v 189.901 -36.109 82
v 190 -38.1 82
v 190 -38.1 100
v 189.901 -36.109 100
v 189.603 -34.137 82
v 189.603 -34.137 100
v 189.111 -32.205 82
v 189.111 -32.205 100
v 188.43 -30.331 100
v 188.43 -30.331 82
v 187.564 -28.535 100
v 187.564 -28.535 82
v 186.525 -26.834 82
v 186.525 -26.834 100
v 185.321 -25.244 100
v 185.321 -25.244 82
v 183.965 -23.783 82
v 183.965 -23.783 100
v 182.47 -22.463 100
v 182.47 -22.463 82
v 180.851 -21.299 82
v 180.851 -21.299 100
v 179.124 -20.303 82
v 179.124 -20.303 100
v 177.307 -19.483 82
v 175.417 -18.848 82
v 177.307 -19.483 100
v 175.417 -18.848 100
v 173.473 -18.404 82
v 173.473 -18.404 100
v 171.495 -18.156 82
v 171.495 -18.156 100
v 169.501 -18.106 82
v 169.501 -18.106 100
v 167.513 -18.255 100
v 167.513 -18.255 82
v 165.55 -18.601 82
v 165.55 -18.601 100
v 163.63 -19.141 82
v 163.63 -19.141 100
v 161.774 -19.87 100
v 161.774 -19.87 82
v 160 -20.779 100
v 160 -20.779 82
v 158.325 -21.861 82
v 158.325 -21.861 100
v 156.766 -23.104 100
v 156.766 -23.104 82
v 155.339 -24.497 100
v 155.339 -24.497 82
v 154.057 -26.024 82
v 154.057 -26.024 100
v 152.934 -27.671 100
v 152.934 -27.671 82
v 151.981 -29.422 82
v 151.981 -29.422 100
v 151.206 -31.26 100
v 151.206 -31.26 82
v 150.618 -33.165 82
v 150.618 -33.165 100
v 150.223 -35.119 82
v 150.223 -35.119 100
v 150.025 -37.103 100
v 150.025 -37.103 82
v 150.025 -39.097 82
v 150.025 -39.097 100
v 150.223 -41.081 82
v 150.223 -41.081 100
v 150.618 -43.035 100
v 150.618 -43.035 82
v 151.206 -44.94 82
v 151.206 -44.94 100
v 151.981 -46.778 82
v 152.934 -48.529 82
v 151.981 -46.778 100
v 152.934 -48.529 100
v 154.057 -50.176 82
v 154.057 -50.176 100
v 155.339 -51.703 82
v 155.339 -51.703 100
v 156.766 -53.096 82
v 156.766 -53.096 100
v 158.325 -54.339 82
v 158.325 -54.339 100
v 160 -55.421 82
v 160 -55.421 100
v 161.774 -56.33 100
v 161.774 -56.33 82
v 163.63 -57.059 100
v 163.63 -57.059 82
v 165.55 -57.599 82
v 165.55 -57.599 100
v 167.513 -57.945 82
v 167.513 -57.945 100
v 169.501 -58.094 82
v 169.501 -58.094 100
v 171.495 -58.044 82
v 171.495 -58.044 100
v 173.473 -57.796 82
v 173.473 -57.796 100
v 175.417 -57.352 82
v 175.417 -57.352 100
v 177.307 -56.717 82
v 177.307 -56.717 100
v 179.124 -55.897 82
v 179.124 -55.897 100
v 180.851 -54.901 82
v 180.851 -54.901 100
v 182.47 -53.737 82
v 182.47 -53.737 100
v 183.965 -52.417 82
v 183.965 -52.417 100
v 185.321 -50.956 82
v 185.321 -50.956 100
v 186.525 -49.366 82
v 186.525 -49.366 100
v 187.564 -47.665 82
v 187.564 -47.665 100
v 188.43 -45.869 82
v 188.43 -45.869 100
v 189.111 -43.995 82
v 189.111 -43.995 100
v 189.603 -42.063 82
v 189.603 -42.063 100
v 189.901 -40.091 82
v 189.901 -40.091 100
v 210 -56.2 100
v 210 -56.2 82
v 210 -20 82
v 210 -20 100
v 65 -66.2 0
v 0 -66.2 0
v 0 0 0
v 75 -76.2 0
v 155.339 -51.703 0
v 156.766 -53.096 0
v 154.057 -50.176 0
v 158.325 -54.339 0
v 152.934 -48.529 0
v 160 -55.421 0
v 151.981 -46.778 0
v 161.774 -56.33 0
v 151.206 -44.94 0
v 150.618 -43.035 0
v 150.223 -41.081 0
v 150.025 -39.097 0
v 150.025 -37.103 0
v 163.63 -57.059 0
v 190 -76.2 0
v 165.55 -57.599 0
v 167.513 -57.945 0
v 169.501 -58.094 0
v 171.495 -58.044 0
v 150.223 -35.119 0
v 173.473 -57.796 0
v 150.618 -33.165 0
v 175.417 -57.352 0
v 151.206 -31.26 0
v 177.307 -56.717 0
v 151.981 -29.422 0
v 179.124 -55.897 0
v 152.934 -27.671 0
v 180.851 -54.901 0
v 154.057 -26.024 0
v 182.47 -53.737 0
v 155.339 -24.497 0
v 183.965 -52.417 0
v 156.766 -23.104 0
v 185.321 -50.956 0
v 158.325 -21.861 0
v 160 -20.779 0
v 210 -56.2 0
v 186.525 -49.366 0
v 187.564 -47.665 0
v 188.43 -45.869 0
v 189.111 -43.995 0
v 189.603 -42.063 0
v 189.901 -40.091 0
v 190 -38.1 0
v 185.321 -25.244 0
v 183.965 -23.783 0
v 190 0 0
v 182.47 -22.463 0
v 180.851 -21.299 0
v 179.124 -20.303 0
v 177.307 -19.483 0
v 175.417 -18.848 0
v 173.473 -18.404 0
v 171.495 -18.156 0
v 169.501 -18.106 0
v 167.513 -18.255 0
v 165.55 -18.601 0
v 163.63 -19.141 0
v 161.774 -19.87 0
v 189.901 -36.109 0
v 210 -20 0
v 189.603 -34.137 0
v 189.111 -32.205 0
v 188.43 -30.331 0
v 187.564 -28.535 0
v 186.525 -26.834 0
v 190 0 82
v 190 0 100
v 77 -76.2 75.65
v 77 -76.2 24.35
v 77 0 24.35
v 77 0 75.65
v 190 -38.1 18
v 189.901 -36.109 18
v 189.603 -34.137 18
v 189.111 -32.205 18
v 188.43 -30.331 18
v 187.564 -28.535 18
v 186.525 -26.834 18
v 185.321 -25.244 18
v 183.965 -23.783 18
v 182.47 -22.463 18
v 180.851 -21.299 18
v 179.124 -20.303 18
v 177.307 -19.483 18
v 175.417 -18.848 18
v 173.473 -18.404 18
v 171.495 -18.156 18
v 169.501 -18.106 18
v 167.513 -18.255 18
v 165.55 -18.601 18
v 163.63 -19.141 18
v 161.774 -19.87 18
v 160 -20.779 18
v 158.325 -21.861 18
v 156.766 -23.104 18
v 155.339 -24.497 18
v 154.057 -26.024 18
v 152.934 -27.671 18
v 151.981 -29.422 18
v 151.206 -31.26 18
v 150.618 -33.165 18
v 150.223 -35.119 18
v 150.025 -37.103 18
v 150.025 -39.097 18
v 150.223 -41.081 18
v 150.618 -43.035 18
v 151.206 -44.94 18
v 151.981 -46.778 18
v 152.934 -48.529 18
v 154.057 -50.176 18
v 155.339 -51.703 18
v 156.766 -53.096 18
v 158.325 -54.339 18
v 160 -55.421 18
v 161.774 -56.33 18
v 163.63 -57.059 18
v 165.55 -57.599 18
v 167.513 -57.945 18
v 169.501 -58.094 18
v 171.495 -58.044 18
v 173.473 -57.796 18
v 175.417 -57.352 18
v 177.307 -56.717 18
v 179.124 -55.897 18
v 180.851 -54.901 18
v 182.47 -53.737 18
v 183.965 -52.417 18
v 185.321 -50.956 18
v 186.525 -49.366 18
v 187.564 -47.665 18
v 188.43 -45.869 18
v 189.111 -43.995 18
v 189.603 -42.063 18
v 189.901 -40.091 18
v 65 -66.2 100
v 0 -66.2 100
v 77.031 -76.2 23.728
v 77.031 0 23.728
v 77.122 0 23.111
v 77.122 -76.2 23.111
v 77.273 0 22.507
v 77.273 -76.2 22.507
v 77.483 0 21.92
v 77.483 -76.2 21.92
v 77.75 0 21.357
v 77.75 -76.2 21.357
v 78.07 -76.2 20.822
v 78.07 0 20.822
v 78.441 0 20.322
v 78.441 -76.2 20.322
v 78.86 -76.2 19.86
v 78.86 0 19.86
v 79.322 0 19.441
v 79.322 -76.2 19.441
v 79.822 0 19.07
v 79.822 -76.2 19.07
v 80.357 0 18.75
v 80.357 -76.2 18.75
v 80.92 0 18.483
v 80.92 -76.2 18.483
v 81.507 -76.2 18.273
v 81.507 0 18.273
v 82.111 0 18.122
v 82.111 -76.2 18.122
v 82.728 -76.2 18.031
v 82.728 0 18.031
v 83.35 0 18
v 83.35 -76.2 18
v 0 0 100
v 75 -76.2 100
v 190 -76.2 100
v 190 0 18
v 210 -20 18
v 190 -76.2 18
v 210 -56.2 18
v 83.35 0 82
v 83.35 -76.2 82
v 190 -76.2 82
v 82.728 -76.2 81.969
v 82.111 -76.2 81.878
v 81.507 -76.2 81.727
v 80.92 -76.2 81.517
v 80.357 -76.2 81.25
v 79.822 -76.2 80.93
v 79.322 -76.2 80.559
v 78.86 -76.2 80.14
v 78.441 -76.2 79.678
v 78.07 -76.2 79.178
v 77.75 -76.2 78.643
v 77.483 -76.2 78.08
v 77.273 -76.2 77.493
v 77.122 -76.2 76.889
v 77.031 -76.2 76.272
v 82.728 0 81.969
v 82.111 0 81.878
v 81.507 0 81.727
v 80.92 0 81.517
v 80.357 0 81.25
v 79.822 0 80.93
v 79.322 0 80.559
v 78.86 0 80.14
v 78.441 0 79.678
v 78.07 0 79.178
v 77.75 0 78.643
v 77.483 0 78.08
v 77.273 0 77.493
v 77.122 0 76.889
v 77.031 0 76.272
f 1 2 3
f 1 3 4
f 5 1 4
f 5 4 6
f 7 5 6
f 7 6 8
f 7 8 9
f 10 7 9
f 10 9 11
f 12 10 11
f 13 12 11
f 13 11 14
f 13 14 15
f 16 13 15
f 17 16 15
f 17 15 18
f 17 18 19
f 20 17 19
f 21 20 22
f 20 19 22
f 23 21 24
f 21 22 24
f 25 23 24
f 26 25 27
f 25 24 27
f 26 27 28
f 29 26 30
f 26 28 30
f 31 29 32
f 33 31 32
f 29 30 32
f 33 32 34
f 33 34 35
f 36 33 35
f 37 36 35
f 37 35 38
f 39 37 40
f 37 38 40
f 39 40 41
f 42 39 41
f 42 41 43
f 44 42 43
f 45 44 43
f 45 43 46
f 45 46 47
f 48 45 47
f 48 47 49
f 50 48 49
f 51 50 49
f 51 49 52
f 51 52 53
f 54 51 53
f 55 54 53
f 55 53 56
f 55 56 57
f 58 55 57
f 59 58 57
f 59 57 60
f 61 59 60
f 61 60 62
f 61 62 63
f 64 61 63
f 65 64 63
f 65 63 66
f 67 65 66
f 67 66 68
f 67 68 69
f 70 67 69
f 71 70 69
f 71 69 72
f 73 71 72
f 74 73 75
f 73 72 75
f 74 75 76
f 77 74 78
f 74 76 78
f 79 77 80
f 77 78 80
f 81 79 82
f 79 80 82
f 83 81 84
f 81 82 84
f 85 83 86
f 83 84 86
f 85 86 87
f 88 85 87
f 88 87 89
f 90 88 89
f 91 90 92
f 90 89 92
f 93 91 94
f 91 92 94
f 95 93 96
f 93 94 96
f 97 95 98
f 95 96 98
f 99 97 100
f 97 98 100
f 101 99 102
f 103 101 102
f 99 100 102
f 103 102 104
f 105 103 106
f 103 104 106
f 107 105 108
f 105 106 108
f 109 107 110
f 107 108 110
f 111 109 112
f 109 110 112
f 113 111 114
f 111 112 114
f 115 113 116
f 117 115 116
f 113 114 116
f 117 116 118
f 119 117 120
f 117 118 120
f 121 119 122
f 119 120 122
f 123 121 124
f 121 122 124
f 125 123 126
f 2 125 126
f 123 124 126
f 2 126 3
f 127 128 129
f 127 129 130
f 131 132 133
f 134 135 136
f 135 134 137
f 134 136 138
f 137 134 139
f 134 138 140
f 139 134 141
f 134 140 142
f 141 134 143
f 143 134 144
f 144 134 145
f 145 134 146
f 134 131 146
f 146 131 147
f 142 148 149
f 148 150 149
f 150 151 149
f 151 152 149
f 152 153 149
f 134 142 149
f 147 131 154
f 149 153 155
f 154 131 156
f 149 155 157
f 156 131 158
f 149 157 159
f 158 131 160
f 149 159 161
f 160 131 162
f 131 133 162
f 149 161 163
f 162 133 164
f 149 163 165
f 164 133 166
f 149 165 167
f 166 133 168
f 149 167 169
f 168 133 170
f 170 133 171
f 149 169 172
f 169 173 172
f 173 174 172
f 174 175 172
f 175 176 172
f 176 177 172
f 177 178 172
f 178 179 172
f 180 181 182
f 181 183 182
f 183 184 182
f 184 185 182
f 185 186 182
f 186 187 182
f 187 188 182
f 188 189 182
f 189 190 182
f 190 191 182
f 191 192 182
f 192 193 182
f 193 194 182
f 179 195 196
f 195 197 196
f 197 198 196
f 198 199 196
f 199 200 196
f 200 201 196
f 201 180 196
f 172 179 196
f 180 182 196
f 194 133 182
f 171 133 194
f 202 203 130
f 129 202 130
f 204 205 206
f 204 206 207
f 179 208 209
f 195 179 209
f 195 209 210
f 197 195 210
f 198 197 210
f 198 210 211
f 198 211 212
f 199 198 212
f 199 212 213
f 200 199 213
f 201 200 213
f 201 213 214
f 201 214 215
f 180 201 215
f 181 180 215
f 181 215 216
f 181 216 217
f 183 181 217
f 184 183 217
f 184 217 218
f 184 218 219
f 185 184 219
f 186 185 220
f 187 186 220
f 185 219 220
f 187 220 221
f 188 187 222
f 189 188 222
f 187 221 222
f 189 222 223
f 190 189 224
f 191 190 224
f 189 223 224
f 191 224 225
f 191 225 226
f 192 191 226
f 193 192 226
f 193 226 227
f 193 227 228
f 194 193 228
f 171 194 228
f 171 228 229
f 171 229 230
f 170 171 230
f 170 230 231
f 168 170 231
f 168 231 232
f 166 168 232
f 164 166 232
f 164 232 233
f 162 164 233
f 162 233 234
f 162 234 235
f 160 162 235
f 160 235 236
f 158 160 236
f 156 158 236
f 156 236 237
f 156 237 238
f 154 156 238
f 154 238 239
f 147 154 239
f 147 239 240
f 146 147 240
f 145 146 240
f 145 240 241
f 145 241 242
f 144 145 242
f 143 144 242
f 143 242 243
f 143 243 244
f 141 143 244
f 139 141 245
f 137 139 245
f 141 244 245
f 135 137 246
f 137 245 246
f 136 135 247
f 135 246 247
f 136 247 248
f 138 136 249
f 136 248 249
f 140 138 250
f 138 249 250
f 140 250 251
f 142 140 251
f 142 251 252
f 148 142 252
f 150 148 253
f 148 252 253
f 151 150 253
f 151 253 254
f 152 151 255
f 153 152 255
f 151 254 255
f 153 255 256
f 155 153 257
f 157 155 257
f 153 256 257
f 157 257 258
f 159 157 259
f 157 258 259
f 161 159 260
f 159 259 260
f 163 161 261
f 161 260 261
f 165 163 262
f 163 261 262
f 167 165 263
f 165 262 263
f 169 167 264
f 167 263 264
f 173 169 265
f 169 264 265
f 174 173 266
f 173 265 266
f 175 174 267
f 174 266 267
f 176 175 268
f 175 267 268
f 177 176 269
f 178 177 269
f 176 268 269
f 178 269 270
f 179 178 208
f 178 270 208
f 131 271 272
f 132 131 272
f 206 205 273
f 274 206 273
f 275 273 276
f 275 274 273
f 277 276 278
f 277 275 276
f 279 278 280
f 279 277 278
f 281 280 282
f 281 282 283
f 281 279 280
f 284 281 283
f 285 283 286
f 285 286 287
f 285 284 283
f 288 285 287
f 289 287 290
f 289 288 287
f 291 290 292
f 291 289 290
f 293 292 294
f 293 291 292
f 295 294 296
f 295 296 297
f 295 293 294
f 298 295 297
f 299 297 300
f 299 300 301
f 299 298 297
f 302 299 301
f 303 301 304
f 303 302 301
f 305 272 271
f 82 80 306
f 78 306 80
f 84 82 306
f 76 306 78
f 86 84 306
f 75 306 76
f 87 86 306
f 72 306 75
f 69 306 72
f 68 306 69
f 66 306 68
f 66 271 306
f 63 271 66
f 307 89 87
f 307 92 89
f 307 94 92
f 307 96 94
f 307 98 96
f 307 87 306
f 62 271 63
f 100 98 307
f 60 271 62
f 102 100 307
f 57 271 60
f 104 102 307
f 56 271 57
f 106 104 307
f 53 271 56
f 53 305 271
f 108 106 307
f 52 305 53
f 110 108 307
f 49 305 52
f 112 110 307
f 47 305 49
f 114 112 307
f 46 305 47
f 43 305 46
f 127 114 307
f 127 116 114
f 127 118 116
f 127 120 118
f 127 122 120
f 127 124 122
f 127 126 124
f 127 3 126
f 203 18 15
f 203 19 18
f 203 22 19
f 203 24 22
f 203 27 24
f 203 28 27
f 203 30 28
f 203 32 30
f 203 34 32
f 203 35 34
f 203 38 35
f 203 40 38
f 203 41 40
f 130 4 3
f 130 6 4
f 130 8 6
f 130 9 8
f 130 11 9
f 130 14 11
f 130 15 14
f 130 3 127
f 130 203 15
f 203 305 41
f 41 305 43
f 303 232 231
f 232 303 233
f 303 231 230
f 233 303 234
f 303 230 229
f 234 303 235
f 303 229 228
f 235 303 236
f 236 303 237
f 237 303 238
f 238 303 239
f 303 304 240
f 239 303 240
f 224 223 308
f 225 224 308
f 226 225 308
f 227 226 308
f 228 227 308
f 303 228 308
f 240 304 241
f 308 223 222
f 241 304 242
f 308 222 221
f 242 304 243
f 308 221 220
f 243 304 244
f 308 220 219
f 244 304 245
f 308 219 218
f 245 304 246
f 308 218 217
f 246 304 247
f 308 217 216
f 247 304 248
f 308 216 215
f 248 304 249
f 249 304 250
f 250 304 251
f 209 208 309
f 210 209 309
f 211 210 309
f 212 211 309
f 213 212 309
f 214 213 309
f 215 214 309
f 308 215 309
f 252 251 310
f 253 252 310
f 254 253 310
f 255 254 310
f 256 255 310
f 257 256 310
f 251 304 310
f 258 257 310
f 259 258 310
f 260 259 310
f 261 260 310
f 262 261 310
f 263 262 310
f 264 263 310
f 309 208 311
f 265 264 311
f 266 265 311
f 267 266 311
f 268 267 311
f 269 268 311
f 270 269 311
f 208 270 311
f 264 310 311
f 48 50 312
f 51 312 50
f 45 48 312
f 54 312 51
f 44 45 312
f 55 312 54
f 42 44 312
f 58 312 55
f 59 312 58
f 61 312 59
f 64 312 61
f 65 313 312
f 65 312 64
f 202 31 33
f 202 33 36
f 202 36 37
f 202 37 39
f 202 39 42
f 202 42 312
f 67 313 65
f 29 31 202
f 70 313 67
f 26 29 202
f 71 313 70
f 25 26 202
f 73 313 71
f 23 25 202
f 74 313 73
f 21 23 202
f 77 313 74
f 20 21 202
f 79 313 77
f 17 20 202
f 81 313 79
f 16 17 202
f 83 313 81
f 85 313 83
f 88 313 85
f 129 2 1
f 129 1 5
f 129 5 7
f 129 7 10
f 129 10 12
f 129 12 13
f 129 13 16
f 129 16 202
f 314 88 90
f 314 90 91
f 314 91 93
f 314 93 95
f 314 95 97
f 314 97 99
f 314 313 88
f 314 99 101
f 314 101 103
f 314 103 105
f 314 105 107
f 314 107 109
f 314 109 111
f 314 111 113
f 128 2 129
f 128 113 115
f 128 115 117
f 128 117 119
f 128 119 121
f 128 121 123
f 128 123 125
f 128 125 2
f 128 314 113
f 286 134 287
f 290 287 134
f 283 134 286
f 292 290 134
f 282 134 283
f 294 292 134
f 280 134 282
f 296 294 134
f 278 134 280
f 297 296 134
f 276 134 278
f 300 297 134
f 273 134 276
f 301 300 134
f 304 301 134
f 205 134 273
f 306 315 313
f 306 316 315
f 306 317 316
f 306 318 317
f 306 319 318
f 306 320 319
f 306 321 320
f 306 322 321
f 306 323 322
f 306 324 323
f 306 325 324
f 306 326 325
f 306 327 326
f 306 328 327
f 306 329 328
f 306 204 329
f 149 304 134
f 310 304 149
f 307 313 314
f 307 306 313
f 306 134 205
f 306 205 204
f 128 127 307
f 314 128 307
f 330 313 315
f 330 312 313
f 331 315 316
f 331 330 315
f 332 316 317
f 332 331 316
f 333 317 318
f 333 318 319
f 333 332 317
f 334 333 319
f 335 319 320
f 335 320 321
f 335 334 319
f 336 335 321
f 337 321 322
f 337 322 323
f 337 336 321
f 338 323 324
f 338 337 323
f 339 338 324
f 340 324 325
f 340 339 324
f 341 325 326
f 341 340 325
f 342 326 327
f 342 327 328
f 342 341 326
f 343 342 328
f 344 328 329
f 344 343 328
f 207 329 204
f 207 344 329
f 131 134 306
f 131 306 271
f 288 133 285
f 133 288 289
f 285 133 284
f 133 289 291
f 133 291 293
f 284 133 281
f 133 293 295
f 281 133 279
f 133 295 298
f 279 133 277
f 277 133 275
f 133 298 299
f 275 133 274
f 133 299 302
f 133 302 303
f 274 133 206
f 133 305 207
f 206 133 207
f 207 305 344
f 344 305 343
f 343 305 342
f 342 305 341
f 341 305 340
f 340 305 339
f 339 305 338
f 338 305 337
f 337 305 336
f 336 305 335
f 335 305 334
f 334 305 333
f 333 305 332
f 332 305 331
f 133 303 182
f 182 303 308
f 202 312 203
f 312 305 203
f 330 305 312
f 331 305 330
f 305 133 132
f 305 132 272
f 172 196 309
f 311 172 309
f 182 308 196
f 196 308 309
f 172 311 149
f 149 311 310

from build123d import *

# Parameters (mm, degrees)
F0_W     = 210
F0_H     = 100
F1_DEPTH = 76.2
F2_W     = 133
F2_H     = 64
F3_DEPTH = 76.201
F4_R     = 6.35
F5_R     = 20
F6_DEPTH = 100.001
F8_DEPTH = 100.001


with BuildPart() as f1:
    # F0 (on Front) → F1 (new body)
    with BuildSketch(Plane.XZ):
        with Locations((105, 50)):
            Rectangle(F0_W, F0_H)
    extrude(amount=F1_DEPTH)

    # F2 (on face) → F3 (cut, through all)
    with BuildSketch(Plane.XZ.offset(76.2)):
        with Locations((143.5, 50)):
            Rectangle(F2_W, F2_H)
    extrude(amount=-F3_DEPTH, mode=Mode.SUBTRACT)

    # F4
    f4_edges = [f1.edges().sort_by_distance(p)[0] for p in [
        (77, -38.1, 82),
        (77, -38.1, 18),
    ]]
    fillet(f4_edges, radius=F4_R)

    # F5 (on face) → F6 (cut, through all)
    with BuildSketch(Plane.XY.offset(100)):
        Polygon((190, 16.513776), (190, 0), (210, -20), (210, -56.2), (190, -76.2), (190, -91.743216), (258.705469, -91.743216), (258.705469, 16.513776), align=None)
        with Locations((170, -38.1)):
            Circle(F5_R)
    extrude(amount=-F6_DEPTH, mode=Mode.SUBTRACT)

    # F7 (on face) → F8 (cut, through all)
    with BuildSketch(Plane.XY.offset(100)):
        Polygon((65, -66.2), (0, -66.2), (0, -76.2), (75, -76.2), align=None)
    extrude(amount=-F8_DEPTH, mode=Mode.SUBTRACT)


solid = f1.part
